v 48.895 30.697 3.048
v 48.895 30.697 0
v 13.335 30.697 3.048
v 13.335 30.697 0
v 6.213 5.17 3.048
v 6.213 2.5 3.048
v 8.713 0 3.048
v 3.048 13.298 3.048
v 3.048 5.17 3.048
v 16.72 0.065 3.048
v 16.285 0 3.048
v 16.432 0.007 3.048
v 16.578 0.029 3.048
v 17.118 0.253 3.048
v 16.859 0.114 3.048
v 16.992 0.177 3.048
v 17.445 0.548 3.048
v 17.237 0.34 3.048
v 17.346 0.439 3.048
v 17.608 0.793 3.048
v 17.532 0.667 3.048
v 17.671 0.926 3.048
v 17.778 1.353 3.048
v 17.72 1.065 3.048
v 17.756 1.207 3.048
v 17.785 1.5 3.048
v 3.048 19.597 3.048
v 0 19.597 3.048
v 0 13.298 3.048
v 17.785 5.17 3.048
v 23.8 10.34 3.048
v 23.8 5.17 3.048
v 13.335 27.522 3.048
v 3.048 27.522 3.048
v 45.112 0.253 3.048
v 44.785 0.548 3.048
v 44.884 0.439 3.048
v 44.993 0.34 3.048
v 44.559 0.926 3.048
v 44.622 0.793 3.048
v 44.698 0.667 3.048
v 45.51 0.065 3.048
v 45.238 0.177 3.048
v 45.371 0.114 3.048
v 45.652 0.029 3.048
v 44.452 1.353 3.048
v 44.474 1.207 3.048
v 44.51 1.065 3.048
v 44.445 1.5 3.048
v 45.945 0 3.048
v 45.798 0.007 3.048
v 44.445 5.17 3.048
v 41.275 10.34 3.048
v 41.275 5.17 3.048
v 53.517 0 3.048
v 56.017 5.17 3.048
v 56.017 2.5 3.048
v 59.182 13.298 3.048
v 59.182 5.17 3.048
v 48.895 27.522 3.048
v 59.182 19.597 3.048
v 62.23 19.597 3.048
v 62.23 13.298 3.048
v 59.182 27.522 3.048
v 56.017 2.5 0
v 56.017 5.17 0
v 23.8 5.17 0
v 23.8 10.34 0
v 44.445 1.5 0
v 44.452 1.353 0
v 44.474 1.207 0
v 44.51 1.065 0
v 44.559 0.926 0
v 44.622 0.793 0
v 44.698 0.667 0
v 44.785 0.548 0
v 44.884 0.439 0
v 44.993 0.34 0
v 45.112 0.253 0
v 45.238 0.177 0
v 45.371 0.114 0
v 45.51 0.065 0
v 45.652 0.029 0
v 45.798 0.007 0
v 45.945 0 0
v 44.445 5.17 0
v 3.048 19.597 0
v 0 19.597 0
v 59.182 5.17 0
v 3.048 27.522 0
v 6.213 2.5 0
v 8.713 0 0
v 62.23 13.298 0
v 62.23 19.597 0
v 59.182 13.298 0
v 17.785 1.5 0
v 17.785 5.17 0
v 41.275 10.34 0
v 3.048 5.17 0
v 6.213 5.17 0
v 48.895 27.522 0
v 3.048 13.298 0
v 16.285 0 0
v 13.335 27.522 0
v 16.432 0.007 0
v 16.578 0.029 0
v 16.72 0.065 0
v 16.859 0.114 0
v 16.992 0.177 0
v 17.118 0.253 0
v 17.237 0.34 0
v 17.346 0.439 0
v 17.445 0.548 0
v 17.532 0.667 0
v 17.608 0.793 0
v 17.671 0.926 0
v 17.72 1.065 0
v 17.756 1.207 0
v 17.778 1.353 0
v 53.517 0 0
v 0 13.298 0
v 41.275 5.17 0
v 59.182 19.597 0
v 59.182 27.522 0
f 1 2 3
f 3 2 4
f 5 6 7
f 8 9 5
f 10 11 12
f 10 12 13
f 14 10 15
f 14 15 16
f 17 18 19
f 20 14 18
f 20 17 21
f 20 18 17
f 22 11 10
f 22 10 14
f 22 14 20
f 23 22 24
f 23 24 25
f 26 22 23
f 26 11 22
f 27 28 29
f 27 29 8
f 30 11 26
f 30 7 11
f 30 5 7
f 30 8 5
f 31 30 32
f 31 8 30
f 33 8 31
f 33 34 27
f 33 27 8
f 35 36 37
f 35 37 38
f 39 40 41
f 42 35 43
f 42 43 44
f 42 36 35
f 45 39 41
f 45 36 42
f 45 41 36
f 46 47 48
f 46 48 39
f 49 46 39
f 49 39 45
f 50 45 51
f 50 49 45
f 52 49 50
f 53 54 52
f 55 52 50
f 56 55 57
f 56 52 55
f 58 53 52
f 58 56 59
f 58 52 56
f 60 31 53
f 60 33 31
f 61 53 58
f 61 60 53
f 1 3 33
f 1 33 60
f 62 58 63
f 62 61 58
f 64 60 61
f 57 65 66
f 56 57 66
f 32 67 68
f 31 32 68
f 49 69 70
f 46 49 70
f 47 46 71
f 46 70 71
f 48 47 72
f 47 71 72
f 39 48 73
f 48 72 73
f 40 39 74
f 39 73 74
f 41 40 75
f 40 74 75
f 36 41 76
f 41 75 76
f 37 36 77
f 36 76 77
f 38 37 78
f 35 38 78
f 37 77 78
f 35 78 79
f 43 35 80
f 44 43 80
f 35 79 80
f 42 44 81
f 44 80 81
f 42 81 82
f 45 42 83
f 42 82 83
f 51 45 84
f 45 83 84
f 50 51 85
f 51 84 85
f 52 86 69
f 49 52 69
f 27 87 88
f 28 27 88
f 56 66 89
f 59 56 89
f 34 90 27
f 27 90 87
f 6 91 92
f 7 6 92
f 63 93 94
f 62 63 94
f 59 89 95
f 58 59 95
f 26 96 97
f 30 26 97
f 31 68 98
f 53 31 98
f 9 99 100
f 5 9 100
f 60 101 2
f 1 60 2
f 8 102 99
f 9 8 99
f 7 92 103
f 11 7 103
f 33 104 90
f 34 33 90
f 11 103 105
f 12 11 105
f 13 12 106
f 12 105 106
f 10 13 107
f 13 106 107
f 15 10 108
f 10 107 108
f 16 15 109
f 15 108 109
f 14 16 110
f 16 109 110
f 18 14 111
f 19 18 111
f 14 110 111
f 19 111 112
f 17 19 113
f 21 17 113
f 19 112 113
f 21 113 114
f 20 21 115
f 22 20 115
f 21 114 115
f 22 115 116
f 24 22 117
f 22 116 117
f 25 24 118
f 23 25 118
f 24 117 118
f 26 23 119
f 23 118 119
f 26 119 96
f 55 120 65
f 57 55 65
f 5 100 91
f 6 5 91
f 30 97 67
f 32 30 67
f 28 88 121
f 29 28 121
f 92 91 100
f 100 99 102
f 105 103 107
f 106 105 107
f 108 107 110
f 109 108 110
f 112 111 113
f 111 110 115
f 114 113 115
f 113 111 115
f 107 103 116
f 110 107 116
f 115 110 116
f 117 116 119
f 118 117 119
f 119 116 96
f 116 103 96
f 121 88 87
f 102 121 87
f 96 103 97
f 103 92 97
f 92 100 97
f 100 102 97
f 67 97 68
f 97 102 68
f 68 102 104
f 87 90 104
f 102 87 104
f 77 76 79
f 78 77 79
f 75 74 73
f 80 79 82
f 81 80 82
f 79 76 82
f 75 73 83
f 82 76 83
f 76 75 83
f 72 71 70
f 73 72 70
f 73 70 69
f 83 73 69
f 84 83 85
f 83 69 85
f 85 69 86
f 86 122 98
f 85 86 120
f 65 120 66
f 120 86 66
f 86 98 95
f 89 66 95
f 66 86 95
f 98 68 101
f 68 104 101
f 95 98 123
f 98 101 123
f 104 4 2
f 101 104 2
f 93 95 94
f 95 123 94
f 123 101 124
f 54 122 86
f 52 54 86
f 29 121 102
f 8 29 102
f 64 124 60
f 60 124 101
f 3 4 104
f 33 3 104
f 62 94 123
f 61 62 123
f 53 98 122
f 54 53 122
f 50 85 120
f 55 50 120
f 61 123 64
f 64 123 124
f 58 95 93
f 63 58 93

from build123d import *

# Parameters (mm, degrees)
BOSS_EXTRUDE1_DEPTH = 3.048


with BuildPart() as part:
    # Model → Boss-Extrude1 (new body)
    with BuildSketch(Plane.XY):
        with BuildLine():
            Line((59.181999415, 5.17), (59.181999415, 13.297999725))
            Line((59.181999415, 13.297999725), (62.229999341, 13.297999725))
            Line((62.229999341, 13.297999725), (62.229999341, 19.597199261))
            Line((62.229999341, 19.597199261), (59.181999415, 19.597199261))
            Line((59.181999415, 19.597199261), (59.181999415, 27.522))
            Line((59.181999415, 27.522), (48.894999549, 27.522))
            Line((48.894999549, 27.522), (48.894999549, 30.696999729))
            Line((48.894999549, 30.696999729), (13.335000724, 30.696999729))
            Line((13.335000724, 30.696999729), (13.335000724, 27.522))
            Line((13.335000724, 27.522), (3.047998995, 27.522))
            Line((3.047998995, 27.522), (3.047998995, 19.597199261))
            Line((3.047998995, 19.597199261), (0, 19.597199261))
            Line((0, 19.597199261), (0, 13.297999725))
            Line((0, 13.297999725), (3.047998995, 13.297999725))
            Line((3.047998995, 13.297999725), (3.047998995, 5.17))
            Line((3.047998995, 5.17), (6.21299938, 5.17))
            Line((6.21299938, 5.17), (6.21299938, 2.5))
            Line((6.21299938, 2.5), (8.71299938, 0))
            Line((8.71299938, 0), (16.28499938, 0))
            ThreePointArc((16.28499938, 0), (17.345659551, 0.439339828), (17.78499938, 1.5))
            Line((17.78499938, 1.5), (17.78499938, 5.17))
            Line((17.78499938, 5.17), (23.799799458, 5.17))
            Line((23.799799458, 5.17), (23.799799458, 10.34))
            Line((23.799799458, 10.34), (41.274999458, 10.34))
            Line((41.274999458, 10.34), (41.274999458, 5.17))
            Line((41.274999458, 5.17), (44.444999458, 5.17))
            Line((44.444999458, 5.17), (44.444999458, 1.5))
            ThreePointArc((44.444999458, 1.5), (44.884339286, 0.439339828), (45.944999458, 0))
            Line((45.944999458, 0), (53.516999458, 0))
            Line((53.516999458, 0), (56.016999458, 2.5))
            Line((56.016999458, 2.5), (56.016999458, 5.17))
            Line((56.016999458, 5.17), (59.181999415, 5.17))
        make_face()
    extrude(amount=BOSS_EXTRUDE1_DEPTH)


solid = part.part
